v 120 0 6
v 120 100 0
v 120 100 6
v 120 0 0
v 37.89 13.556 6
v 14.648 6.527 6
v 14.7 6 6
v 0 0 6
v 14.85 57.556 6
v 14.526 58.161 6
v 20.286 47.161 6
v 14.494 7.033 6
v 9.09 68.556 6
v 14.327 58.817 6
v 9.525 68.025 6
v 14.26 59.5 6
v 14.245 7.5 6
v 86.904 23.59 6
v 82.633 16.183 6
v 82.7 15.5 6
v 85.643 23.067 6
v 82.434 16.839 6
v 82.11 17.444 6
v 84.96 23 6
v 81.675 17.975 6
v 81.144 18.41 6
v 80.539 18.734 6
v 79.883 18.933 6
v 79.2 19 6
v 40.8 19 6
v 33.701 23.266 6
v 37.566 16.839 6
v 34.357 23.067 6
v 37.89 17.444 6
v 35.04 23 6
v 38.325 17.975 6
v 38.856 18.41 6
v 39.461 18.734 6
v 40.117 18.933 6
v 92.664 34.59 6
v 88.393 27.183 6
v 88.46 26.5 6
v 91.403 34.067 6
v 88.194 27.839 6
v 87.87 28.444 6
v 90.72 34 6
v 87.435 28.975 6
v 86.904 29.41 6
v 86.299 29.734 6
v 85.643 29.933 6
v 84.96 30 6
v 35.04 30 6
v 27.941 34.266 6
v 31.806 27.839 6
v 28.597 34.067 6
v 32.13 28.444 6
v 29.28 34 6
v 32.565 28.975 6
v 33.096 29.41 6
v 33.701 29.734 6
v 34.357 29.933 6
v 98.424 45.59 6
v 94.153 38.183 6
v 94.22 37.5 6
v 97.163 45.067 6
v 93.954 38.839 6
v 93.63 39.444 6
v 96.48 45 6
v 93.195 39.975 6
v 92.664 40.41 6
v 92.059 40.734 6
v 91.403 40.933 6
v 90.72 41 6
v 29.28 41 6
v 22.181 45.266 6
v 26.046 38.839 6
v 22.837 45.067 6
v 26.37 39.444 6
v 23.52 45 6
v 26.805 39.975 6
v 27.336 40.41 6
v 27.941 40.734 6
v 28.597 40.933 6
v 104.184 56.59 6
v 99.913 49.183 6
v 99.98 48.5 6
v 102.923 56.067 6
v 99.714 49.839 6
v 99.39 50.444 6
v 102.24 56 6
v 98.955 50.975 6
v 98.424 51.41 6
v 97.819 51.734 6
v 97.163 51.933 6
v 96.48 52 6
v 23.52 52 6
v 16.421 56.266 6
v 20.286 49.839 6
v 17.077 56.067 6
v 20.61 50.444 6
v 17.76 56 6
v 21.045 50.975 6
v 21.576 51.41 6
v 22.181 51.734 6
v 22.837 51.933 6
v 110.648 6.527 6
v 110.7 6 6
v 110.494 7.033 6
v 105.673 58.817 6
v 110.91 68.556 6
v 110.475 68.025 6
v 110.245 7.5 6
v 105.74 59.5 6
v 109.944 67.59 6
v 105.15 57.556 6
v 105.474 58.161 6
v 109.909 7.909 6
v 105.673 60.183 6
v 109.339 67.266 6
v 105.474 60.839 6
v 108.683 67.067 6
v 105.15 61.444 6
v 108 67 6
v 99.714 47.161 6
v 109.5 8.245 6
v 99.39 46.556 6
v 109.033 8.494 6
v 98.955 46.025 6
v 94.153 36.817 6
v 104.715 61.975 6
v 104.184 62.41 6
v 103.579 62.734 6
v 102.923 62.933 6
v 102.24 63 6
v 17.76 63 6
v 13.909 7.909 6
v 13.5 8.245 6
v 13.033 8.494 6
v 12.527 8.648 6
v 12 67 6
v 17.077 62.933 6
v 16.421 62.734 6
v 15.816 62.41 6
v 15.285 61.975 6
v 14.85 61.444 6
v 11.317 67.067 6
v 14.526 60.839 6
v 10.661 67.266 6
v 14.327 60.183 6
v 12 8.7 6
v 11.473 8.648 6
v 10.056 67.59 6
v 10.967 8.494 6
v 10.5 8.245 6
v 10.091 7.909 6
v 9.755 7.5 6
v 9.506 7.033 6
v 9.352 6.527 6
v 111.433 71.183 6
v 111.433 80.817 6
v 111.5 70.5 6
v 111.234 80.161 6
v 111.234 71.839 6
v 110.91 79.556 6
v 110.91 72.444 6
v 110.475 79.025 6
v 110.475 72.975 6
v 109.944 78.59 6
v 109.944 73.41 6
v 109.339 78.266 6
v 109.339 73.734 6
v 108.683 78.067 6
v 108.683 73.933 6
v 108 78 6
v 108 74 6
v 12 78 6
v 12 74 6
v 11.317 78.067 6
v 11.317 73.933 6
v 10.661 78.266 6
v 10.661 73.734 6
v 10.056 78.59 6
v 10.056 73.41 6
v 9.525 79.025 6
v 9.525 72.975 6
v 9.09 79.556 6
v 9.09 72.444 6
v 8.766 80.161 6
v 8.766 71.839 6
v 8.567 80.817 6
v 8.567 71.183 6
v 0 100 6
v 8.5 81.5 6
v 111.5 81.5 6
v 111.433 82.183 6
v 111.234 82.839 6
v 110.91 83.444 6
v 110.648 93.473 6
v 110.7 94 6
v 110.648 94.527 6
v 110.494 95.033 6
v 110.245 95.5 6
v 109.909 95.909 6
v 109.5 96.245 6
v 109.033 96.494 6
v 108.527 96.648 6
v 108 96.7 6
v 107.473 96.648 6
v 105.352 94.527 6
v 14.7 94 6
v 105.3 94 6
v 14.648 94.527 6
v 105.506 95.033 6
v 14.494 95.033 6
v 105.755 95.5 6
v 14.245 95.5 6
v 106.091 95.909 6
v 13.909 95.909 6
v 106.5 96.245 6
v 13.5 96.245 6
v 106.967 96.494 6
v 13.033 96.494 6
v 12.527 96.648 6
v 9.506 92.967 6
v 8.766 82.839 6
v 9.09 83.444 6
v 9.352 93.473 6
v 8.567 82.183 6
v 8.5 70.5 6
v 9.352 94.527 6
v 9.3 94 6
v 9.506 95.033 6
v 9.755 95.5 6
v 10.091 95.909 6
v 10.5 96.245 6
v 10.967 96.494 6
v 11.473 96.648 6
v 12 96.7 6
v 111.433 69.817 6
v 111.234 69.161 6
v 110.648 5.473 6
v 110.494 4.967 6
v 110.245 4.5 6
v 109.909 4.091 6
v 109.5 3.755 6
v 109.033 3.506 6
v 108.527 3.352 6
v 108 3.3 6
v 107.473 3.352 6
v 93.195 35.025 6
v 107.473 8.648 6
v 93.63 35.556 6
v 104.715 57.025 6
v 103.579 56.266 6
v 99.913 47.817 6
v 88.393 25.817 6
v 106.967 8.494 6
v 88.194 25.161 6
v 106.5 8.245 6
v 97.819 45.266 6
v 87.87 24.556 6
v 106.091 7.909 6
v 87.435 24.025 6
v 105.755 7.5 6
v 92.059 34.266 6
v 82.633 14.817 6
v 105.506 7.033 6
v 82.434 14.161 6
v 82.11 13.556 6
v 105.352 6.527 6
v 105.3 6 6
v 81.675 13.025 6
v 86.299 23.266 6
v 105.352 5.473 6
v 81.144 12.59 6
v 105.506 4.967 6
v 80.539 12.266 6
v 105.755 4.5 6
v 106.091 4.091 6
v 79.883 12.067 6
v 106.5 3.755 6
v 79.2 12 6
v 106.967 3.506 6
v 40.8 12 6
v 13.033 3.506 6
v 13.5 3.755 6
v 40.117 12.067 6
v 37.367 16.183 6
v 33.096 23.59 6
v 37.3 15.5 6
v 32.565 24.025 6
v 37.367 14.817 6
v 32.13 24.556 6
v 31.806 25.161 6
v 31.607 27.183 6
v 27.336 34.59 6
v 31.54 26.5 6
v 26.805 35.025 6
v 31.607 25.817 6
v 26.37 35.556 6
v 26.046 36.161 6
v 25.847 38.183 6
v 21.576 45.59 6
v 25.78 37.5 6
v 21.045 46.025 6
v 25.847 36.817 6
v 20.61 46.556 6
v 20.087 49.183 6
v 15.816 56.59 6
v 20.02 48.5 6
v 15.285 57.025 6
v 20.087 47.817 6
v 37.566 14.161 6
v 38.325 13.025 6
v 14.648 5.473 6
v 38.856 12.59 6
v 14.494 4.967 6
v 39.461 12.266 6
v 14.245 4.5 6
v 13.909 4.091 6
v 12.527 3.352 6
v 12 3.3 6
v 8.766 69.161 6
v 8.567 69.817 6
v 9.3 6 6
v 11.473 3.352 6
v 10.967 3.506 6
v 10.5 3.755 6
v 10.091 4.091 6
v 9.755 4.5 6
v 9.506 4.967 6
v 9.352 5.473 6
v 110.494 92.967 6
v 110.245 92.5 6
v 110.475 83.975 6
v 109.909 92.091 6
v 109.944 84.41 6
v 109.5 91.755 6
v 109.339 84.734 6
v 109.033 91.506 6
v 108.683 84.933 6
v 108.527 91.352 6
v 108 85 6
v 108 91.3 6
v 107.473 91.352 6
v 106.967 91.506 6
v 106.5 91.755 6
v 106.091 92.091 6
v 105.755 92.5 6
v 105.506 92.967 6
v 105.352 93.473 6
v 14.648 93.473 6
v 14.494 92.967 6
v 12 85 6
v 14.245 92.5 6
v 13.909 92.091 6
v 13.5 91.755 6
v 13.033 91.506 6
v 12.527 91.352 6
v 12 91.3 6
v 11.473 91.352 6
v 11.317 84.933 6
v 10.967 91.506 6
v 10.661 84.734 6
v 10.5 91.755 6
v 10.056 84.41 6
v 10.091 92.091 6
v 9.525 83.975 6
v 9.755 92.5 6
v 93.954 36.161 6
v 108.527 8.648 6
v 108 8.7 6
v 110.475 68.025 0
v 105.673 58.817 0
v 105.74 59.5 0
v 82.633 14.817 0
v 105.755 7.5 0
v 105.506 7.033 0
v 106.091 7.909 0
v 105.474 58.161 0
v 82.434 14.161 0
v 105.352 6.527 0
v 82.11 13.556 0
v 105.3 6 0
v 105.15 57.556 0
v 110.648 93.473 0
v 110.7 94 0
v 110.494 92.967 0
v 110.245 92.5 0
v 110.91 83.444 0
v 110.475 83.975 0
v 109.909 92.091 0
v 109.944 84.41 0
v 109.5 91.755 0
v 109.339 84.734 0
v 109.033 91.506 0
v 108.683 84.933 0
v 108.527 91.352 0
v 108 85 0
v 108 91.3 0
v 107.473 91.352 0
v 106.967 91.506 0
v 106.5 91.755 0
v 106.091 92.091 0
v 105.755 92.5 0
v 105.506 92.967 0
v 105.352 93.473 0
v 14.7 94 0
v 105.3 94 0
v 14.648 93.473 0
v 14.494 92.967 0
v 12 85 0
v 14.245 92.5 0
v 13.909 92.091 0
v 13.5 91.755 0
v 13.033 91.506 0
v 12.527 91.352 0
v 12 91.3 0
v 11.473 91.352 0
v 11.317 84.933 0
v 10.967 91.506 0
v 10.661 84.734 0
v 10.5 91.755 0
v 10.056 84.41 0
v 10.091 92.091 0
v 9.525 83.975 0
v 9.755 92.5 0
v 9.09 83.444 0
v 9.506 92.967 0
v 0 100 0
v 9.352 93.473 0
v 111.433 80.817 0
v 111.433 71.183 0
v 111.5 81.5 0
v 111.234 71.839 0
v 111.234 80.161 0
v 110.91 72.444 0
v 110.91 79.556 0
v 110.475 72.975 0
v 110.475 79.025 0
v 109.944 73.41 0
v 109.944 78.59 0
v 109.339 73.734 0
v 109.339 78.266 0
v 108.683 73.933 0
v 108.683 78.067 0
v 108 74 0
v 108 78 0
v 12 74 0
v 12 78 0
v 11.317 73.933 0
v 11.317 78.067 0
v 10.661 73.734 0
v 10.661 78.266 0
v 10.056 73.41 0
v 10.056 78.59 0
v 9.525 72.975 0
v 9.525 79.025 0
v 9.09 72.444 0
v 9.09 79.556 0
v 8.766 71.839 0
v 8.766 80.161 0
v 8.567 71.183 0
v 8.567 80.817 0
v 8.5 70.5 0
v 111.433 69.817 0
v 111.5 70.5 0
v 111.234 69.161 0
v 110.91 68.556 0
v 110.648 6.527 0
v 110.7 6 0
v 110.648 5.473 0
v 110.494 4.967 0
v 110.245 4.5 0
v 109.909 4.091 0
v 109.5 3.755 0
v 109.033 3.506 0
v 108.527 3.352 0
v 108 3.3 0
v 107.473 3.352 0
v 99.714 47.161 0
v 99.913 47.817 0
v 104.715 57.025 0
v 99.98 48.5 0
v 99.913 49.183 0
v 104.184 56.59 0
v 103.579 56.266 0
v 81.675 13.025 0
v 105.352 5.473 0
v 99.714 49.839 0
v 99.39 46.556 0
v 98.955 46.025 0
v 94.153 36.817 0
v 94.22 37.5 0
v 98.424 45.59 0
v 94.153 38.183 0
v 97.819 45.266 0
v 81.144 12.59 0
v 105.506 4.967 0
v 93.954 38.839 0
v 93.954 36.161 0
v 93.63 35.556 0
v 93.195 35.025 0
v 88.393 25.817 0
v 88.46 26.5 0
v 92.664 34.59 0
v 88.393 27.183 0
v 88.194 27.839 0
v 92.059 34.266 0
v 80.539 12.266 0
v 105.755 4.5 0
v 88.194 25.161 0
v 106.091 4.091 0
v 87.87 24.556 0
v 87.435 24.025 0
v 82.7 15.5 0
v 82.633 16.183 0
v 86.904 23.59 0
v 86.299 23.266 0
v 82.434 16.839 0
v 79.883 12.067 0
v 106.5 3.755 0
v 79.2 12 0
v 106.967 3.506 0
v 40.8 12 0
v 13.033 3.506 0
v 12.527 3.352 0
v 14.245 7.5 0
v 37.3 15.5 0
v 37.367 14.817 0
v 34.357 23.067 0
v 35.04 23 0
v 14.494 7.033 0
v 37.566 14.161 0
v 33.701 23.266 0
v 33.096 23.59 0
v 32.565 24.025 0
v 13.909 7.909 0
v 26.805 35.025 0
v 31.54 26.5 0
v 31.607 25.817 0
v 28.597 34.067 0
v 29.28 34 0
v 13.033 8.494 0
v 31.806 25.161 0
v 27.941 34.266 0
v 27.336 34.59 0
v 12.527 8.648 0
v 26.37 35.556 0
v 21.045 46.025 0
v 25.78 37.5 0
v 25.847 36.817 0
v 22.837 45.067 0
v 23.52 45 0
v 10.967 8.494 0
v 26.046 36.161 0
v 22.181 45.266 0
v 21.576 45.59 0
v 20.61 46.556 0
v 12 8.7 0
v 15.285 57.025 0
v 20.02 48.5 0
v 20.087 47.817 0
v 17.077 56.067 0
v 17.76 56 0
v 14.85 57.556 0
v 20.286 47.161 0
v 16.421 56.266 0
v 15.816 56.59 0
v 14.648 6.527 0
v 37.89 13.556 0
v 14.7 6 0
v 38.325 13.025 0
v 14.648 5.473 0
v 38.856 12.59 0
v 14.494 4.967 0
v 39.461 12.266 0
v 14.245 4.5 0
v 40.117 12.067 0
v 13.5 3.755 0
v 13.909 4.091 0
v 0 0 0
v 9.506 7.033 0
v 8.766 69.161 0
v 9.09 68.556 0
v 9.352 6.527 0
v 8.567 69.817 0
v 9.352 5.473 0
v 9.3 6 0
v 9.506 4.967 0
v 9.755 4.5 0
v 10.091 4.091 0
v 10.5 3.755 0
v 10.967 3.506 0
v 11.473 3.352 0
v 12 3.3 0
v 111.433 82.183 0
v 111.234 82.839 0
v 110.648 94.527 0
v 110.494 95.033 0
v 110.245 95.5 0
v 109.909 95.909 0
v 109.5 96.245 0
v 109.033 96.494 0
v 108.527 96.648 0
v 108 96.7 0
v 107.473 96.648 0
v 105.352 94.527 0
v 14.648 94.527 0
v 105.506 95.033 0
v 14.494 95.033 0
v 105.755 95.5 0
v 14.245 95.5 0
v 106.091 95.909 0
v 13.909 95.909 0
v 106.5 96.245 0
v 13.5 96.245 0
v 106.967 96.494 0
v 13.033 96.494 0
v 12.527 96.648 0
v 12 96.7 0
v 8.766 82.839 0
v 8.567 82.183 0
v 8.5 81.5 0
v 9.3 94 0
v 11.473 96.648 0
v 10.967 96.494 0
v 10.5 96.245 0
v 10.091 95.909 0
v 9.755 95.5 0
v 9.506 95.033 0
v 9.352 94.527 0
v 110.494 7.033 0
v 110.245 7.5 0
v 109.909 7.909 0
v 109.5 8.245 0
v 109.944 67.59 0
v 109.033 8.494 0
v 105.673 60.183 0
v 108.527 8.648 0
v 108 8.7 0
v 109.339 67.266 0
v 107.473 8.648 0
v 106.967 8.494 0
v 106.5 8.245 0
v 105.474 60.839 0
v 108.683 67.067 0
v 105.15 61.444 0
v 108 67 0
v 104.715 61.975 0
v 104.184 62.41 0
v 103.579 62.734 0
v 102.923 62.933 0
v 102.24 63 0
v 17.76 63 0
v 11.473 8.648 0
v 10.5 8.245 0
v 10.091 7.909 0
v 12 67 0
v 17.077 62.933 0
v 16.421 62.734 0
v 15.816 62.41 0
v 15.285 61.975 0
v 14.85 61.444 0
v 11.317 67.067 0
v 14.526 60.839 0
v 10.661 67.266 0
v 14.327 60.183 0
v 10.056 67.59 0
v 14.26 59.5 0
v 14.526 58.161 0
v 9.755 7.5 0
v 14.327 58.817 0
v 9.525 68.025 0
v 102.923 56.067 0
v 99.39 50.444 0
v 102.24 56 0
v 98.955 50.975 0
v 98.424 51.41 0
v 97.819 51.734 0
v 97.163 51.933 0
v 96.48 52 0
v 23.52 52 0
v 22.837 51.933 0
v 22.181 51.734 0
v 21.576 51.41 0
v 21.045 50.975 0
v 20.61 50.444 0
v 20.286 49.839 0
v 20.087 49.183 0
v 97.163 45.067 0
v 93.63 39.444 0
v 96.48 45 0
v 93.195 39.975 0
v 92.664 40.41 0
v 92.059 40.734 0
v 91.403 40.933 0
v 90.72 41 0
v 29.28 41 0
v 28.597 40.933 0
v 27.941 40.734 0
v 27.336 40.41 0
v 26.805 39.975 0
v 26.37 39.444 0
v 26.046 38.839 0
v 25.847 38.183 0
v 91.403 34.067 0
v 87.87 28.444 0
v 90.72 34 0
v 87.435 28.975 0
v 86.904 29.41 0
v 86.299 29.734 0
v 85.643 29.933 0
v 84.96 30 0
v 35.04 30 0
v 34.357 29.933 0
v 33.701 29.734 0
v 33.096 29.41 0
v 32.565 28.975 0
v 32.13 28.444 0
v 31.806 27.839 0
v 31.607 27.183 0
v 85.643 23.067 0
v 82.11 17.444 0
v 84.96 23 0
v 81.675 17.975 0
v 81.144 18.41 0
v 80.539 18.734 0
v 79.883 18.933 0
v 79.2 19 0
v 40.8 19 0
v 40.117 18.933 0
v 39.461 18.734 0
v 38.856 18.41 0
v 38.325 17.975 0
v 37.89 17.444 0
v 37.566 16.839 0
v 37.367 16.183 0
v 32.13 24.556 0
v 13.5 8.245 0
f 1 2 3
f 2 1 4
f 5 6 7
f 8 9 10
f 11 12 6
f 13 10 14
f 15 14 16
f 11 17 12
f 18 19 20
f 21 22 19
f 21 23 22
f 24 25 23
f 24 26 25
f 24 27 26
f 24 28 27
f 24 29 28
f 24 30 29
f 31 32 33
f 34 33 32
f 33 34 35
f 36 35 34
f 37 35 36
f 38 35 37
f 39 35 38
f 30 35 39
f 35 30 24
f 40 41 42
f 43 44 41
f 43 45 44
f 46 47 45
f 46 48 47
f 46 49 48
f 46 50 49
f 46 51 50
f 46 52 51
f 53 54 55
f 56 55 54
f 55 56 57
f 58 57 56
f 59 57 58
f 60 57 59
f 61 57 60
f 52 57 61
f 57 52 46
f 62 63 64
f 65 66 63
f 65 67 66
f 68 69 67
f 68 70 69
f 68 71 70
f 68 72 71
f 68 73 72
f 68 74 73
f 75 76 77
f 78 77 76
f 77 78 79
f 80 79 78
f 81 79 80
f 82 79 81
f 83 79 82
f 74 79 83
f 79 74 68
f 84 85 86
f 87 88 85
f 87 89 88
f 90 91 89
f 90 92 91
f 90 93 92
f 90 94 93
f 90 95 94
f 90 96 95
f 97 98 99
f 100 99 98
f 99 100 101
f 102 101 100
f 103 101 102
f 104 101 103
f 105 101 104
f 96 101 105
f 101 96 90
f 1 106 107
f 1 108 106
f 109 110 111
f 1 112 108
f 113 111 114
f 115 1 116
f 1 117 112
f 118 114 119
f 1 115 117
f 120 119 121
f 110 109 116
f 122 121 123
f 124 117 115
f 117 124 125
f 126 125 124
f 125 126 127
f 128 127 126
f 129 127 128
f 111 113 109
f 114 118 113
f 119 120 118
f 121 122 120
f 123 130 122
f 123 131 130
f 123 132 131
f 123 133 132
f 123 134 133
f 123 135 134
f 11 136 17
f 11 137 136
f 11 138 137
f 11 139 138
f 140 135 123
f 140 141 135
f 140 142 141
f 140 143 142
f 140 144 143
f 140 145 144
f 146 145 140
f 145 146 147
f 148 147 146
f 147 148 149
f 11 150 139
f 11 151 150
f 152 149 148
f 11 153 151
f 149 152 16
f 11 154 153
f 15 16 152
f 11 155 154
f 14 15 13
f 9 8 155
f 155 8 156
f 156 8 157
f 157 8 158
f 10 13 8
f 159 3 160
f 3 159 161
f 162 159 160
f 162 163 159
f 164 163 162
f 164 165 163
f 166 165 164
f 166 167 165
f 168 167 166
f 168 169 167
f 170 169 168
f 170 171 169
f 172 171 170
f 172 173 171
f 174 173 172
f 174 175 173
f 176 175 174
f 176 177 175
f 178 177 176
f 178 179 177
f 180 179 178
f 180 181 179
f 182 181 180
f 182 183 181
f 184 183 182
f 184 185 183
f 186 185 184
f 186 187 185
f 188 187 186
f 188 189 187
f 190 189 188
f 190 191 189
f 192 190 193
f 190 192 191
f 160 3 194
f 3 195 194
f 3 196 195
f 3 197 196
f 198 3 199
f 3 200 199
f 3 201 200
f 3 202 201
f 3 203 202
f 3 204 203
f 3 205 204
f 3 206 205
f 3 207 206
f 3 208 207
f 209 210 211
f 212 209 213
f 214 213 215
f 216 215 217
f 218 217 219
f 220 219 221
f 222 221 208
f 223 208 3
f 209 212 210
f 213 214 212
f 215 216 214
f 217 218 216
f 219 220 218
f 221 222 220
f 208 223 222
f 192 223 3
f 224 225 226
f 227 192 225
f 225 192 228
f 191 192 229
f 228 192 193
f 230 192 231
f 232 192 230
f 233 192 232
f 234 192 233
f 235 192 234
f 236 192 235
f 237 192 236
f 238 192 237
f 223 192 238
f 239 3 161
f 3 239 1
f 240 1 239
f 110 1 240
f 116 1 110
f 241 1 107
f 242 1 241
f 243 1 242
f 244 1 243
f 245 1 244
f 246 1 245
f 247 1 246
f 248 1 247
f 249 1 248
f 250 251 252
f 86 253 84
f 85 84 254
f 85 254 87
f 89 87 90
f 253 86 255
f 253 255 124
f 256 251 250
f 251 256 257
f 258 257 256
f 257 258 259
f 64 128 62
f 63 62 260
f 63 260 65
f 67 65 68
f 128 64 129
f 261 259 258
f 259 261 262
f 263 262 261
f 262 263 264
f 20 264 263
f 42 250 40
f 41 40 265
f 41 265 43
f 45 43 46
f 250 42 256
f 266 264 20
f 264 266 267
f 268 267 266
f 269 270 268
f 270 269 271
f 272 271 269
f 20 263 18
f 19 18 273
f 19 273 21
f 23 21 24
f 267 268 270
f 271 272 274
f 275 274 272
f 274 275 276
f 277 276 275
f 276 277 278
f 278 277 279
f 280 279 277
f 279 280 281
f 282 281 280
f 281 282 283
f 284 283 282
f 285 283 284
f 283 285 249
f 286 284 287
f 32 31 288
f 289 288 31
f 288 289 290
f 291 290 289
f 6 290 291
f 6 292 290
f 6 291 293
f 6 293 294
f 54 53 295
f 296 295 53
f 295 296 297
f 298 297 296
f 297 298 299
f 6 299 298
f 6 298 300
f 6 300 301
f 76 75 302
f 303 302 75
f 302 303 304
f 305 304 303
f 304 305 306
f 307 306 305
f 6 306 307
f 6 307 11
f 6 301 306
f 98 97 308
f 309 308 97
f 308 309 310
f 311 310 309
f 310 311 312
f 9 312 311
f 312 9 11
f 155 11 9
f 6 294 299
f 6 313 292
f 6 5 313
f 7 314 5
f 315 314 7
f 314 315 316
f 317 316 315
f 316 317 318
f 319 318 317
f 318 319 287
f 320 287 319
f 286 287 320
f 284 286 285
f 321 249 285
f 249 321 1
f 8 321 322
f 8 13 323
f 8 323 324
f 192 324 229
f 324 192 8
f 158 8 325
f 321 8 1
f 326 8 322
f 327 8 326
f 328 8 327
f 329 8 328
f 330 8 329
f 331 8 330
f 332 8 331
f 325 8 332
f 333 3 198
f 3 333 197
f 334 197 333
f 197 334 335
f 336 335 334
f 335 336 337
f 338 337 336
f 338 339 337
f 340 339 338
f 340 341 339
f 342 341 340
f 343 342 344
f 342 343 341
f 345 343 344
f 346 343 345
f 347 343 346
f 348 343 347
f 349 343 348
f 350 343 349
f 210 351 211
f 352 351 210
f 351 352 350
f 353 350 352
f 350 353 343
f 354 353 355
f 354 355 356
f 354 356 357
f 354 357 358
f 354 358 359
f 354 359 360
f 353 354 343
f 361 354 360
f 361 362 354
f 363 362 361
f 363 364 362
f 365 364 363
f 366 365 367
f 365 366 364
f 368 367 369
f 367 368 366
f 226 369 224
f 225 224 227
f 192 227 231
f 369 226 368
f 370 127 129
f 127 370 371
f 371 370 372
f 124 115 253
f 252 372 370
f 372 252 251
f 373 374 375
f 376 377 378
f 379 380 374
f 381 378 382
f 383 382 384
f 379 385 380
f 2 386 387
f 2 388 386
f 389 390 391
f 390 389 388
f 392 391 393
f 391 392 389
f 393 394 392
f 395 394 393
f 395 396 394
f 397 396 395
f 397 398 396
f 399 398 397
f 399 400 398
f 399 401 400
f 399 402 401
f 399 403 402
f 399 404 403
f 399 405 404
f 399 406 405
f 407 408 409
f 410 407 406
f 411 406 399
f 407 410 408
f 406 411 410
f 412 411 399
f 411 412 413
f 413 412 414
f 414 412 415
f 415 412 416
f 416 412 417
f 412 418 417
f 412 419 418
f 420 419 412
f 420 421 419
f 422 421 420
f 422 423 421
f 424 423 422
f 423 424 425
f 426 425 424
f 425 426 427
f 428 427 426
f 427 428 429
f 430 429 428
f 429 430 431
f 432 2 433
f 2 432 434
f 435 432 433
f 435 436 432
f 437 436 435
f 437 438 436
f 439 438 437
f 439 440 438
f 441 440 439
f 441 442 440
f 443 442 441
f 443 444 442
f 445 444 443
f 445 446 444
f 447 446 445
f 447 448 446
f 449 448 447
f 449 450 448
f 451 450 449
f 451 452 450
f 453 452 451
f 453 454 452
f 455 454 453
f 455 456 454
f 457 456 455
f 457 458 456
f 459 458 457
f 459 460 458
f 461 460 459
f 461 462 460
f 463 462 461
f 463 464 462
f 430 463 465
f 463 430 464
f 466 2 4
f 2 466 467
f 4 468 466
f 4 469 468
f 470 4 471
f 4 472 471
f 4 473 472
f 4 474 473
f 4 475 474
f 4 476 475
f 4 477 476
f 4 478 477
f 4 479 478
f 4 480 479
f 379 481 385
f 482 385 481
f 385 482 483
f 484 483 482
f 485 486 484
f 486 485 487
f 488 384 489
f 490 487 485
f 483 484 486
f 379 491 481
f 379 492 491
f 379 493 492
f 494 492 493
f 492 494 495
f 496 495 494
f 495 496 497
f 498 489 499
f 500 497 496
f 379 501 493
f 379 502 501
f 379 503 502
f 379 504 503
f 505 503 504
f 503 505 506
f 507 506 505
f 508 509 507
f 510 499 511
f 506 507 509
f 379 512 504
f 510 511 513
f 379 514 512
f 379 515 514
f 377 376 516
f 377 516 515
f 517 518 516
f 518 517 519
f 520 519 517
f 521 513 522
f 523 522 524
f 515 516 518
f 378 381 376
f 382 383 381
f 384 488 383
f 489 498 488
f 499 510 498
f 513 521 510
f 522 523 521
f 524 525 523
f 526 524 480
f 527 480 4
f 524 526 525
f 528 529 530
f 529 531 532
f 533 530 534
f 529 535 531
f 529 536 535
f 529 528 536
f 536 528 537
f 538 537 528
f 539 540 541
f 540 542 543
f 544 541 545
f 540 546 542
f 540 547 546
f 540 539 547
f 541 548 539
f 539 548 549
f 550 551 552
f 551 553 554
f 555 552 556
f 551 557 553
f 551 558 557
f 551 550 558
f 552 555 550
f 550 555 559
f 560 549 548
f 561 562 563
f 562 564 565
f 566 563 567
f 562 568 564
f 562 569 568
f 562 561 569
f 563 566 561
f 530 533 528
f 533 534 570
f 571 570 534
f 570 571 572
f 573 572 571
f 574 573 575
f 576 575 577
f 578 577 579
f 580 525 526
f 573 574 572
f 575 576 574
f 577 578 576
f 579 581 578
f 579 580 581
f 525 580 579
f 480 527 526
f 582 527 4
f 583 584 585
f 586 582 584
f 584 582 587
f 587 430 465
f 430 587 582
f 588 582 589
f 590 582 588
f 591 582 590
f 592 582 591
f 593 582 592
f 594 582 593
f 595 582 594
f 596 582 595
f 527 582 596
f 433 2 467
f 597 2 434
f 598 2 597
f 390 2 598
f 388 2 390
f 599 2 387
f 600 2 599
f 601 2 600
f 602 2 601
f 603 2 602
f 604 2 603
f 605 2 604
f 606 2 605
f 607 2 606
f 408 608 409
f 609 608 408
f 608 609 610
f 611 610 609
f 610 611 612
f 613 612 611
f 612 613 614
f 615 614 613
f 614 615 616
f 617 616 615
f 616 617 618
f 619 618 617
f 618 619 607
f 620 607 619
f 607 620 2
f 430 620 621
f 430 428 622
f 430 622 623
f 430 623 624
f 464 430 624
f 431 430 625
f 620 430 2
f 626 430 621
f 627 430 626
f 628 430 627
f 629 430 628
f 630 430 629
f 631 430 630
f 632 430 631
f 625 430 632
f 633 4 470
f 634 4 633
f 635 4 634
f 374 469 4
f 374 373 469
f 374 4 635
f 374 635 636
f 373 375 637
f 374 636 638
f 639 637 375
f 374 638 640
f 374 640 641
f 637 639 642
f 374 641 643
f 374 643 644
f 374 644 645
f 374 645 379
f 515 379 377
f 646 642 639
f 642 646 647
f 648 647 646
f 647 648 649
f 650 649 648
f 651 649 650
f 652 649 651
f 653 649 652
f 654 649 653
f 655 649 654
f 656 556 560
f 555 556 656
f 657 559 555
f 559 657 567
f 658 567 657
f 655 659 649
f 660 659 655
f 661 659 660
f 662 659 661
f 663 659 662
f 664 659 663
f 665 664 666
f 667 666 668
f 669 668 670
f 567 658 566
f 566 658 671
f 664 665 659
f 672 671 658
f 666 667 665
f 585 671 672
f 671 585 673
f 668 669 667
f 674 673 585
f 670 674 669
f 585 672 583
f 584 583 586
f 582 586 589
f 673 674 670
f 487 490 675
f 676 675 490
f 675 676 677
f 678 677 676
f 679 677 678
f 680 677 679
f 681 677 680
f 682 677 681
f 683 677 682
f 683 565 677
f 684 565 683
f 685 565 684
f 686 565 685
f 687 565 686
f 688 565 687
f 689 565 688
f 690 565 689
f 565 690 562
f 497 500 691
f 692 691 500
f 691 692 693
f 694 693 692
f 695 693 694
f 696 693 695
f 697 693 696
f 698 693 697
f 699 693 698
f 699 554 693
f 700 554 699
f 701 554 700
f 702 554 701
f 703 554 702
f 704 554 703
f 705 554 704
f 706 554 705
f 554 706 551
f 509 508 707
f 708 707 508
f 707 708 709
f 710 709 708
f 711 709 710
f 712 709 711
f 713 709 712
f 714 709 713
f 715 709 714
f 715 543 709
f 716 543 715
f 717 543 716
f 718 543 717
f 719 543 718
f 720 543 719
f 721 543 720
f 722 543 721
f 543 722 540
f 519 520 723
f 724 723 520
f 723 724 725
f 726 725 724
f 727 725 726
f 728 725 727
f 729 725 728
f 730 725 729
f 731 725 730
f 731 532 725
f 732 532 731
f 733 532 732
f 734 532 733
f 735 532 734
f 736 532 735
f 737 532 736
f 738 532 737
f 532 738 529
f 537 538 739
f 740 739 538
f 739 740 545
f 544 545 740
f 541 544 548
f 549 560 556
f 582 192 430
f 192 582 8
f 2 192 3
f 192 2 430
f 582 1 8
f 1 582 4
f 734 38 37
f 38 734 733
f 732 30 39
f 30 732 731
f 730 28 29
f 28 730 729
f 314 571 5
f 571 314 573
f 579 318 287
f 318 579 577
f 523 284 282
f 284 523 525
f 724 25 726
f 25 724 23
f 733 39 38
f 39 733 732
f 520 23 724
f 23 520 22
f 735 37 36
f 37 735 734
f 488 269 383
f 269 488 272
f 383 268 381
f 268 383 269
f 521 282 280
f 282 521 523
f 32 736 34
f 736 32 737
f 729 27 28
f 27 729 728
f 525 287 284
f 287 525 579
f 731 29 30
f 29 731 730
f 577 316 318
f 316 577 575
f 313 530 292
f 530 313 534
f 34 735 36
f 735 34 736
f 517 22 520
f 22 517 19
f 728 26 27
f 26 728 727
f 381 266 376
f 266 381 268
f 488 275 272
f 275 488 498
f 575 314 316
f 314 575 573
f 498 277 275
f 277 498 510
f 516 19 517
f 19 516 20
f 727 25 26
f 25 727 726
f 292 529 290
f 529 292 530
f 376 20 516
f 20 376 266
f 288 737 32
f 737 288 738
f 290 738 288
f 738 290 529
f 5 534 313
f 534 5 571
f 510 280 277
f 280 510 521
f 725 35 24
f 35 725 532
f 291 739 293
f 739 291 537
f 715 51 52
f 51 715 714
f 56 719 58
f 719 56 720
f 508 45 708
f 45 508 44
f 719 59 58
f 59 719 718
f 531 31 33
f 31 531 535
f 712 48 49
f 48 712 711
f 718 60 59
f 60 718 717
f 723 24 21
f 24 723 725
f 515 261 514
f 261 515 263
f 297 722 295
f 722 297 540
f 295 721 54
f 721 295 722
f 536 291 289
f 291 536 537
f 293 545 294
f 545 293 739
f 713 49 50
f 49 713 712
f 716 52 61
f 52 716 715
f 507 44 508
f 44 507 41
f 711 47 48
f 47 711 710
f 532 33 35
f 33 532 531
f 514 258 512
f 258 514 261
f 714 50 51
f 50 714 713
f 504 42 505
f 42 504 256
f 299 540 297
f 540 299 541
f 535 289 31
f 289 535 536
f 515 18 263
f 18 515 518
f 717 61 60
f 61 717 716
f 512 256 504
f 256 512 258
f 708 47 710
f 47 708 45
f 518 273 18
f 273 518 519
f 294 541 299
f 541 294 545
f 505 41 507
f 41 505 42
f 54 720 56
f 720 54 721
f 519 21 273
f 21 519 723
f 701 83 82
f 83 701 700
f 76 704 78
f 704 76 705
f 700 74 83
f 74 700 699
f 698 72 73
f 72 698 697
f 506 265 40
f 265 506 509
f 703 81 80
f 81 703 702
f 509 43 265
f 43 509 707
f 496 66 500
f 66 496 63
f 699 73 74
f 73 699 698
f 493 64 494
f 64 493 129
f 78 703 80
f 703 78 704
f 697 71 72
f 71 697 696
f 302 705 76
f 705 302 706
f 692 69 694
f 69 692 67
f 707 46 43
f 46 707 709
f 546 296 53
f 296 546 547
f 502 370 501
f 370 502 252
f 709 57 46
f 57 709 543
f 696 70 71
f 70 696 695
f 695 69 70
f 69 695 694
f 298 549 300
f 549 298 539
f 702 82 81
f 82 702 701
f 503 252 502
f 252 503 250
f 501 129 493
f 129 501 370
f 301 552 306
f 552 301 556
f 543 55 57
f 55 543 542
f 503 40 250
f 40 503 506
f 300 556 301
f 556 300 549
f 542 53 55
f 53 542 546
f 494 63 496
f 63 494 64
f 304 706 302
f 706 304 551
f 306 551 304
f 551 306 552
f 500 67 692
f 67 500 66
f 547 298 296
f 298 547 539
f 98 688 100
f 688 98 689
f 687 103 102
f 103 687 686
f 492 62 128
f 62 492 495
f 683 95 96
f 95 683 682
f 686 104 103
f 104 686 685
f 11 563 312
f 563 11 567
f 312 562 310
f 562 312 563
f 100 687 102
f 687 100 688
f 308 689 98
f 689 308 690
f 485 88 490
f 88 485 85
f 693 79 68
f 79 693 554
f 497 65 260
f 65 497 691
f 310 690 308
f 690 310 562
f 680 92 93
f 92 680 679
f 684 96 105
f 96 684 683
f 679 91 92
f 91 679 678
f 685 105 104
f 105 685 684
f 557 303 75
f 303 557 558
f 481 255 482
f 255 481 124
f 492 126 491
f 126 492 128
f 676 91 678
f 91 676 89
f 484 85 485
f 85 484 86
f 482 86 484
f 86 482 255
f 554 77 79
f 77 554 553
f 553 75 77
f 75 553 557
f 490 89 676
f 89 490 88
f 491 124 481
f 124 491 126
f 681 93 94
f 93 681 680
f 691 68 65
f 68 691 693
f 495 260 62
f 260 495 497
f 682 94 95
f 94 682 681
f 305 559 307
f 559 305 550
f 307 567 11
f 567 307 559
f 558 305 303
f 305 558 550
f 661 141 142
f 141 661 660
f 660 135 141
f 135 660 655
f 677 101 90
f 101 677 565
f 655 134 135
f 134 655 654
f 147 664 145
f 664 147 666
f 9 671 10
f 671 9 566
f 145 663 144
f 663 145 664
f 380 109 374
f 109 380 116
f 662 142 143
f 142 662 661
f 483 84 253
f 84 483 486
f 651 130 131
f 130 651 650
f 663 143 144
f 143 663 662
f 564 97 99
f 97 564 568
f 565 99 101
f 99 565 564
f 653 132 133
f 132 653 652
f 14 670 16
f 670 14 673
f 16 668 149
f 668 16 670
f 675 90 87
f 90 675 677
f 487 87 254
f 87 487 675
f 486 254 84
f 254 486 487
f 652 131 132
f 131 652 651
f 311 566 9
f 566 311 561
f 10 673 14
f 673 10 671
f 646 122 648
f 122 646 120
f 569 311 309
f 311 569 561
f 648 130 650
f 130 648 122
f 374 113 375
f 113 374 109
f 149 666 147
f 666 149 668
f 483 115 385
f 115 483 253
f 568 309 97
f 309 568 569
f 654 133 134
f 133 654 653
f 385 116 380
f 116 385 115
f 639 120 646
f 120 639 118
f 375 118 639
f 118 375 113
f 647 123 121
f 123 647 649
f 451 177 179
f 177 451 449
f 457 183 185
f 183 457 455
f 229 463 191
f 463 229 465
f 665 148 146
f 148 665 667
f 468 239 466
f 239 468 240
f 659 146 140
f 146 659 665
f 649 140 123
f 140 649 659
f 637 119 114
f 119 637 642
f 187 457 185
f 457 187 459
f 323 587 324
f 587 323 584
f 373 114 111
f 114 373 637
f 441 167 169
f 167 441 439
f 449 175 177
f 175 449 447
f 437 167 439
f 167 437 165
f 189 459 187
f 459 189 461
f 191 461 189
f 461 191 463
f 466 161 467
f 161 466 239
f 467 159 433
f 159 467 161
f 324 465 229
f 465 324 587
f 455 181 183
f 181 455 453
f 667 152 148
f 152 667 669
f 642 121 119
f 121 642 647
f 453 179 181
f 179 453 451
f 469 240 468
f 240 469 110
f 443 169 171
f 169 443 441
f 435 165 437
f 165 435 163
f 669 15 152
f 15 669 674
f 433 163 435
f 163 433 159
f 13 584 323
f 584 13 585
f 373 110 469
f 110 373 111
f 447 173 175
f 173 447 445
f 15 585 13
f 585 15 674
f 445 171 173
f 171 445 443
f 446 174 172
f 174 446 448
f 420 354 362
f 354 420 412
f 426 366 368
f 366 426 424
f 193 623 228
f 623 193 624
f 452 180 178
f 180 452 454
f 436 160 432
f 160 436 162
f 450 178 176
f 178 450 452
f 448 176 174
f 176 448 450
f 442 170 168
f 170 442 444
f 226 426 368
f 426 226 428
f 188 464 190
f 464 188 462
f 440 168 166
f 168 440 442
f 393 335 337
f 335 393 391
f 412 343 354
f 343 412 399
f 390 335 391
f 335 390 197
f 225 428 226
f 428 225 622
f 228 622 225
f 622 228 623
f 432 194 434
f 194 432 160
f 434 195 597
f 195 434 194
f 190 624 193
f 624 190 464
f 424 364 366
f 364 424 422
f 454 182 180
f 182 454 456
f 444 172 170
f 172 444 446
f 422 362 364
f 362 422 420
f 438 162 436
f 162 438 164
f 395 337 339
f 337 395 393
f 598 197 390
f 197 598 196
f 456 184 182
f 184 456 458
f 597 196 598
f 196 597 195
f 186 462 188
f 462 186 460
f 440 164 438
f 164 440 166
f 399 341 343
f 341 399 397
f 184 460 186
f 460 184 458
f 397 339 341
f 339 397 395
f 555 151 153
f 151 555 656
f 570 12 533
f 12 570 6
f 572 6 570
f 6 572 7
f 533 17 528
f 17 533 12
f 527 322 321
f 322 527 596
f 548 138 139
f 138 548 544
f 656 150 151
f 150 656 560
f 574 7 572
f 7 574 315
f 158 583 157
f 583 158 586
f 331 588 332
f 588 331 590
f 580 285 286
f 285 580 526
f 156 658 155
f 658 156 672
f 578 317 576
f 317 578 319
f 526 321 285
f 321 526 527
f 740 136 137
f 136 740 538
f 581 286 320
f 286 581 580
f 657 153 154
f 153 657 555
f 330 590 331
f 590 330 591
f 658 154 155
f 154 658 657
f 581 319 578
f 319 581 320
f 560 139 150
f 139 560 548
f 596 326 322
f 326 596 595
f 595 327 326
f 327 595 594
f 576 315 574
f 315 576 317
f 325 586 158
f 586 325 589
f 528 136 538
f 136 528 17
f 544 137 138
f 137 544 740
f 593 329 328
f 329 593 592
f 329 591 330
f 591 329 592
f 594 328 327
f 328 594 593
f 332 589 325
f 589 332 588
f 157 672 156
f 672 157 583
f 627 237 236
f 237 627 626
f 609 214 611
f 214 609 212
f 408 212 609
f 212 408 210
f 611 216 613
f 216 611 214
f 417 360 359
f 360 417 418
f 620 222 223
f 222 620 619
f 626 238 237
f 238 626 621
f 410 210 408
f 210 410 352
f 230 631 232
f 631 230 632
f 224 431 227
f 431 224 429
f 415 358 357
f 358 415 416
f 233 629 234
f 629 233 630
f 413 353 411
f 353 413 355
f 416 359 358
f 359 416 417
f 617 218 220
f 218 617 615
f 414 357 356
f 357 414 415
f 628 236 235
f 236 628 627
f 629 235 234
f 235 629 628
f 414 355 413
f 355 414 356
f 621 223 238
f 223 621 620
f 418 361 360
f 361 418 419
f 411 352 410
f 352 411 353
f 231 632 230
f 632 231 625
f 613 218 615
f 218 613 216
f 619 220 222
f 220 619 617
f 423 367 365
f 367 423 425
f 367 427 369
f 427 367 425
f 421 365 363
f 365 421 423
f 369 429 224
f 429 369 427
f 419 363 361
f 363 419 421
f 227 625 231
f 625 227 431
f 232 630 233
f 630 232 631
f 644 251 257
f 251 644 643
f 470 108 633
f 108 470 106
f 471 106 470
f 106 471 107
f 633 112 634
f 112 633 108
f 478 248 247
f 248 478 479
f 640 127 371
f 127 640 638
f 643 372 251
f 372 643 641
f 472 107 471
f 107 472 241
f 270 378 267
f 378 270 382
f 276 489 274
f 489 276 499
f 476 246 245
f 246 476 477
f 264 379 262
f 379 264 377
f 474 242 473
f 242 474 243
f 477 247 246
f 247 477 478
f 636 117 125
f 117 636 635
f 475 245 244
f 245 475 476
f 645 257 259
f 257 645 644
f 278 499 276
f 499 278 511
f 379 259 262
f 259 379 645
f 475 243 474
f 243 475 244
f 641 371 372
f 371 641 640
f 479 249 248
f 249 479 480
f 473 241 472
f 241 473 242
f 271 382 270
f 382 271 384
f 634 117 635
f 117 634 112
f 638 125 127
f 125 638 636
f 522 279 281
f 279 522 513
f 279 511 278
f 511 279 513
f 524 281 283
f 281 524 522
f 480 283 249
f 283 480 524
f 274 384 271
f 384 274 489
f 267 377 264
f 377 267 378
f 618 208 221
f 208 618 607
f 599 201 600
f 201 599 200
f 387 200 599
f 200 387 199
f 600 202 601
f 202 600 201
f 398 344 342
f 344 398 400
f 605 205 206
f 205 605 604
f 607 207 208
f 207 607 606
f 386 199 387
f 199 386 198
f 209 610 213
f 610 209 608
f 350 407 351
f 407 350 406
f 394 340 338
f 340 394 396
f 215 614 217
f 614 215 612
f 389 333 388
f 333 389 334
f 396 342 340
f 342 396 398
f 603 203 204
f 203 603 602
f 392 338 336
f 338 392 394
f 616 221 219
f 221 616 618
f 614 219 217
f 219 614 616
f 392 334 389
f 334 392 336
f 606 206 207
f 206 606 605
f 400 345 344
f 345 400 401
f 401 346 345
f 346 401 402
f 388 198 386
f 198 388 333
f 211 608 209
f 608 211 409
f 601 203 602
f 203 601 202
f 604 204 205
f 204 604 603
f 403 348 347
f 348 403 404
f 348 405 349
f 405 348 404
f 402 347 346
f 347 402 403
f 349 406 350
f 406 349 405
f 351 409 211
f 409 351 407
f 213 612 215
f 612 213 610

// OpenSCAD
$fn = 32;

// ----------------------------------------------------------------------
// Slotted panel: 120 x 100 mm, 7 рядов of slots
// ----------------------------------------------------------------------

// --- parameters (mm) ---
panel_w = 120;            // panel width
panel_d = 100;            // panel depth
thick = 6;                // panel thickness
slot_w = 7;               // slot width
pitch0 = 11;              // first row pitch
pitch_step = 1.2;         // pitch increase per row
margin = 12;              // margin around the slot field
rows = 7;                 // number of slot rows
mount_d = 5.4;            // mounting holes
mount_x = 48;             // mounting hole offset

difference() {
  union() {
    cube([panel_w, panel_d, thick]);
  }
  /* slot rows: stadium shaped cutters, 2.5 mm clear of both faces */
  /* row 0: pitch 11, length 38.4 */
  hull() {
    translate([40.8, 15.5, -2.5]) cylinder(h = thick + 5, d = slot_w);
    translate([79.2, 15.5, -2.5]) cylinder(h = thick + 5, d = slot_w);
  }
  /* row 1: pitch 11, length 49.92 */
  hull() {
    translate([35.04, 26.5, -2.5]) cylinder(h = thick + 5, d = slot_w);
    translate([84.96, 26.5, -2.5]) cylinder(h = thick + 5, d = slot_w);
  }
  /* row 2: pitch 11, length 61.44 */
  hull() {
    translate([29.28, 37.5, -2.5]) cylinder(h = thick + 5, d = slot_w);
    translate([90.72, 37.5, -2.5]) cylinder(h = thick + 5, d = slot_w);
  }
  /* row 3: pitch 11, length 72.96 */
  hull() {
    translate([23.52, 48.5, -2.5]) cylinder(h = thick + 5, d = slot_w);
    translate([96.48, 48.5, -2.5]) cylinder(h = thick + 5, d = slot_w);
  }
  /* row 4: pitch 11, length 84.48 */
  hull() {
    translate([17.76, 59.5, -2.5]) cylinder(h = thick + 5, d = slot_w);
    translate([102.24, 59.5, -2.5]) cylinder(h = thick + 5, d = slot_w);
  }
  /* row 5: pitch 11, length 96 */
  hull() {
    translate([12, 70.5, -2.5]) cylinder(h = thick + 5, d = slot_w);
    translate([108, 70.5, -2.5]) cylinder(h = thick + 5, d = slot_w);
  }
  /* row 6: pitch 11, length 96 */
  hull() {
    translate([12, 81.5, -2.5]) cylinder(h = thick + 5, d = slot_w);
    translate([108, 81.5, -2.5]) cylinder(h = thick + 5, d = slot_w);
  }
  translate([12, 6, -2.5]) cylinder(h = 11, d = mount_d);
  translate([12, 94, -2.5]) cylinder(h = 11, d = mount_d);
  translate([108, 6, -2.5]) cylinder(h = 11, d = mount_d);
  translate([108, 94, -2.5]) cylinder(h = 11, d = mount_d);
}
